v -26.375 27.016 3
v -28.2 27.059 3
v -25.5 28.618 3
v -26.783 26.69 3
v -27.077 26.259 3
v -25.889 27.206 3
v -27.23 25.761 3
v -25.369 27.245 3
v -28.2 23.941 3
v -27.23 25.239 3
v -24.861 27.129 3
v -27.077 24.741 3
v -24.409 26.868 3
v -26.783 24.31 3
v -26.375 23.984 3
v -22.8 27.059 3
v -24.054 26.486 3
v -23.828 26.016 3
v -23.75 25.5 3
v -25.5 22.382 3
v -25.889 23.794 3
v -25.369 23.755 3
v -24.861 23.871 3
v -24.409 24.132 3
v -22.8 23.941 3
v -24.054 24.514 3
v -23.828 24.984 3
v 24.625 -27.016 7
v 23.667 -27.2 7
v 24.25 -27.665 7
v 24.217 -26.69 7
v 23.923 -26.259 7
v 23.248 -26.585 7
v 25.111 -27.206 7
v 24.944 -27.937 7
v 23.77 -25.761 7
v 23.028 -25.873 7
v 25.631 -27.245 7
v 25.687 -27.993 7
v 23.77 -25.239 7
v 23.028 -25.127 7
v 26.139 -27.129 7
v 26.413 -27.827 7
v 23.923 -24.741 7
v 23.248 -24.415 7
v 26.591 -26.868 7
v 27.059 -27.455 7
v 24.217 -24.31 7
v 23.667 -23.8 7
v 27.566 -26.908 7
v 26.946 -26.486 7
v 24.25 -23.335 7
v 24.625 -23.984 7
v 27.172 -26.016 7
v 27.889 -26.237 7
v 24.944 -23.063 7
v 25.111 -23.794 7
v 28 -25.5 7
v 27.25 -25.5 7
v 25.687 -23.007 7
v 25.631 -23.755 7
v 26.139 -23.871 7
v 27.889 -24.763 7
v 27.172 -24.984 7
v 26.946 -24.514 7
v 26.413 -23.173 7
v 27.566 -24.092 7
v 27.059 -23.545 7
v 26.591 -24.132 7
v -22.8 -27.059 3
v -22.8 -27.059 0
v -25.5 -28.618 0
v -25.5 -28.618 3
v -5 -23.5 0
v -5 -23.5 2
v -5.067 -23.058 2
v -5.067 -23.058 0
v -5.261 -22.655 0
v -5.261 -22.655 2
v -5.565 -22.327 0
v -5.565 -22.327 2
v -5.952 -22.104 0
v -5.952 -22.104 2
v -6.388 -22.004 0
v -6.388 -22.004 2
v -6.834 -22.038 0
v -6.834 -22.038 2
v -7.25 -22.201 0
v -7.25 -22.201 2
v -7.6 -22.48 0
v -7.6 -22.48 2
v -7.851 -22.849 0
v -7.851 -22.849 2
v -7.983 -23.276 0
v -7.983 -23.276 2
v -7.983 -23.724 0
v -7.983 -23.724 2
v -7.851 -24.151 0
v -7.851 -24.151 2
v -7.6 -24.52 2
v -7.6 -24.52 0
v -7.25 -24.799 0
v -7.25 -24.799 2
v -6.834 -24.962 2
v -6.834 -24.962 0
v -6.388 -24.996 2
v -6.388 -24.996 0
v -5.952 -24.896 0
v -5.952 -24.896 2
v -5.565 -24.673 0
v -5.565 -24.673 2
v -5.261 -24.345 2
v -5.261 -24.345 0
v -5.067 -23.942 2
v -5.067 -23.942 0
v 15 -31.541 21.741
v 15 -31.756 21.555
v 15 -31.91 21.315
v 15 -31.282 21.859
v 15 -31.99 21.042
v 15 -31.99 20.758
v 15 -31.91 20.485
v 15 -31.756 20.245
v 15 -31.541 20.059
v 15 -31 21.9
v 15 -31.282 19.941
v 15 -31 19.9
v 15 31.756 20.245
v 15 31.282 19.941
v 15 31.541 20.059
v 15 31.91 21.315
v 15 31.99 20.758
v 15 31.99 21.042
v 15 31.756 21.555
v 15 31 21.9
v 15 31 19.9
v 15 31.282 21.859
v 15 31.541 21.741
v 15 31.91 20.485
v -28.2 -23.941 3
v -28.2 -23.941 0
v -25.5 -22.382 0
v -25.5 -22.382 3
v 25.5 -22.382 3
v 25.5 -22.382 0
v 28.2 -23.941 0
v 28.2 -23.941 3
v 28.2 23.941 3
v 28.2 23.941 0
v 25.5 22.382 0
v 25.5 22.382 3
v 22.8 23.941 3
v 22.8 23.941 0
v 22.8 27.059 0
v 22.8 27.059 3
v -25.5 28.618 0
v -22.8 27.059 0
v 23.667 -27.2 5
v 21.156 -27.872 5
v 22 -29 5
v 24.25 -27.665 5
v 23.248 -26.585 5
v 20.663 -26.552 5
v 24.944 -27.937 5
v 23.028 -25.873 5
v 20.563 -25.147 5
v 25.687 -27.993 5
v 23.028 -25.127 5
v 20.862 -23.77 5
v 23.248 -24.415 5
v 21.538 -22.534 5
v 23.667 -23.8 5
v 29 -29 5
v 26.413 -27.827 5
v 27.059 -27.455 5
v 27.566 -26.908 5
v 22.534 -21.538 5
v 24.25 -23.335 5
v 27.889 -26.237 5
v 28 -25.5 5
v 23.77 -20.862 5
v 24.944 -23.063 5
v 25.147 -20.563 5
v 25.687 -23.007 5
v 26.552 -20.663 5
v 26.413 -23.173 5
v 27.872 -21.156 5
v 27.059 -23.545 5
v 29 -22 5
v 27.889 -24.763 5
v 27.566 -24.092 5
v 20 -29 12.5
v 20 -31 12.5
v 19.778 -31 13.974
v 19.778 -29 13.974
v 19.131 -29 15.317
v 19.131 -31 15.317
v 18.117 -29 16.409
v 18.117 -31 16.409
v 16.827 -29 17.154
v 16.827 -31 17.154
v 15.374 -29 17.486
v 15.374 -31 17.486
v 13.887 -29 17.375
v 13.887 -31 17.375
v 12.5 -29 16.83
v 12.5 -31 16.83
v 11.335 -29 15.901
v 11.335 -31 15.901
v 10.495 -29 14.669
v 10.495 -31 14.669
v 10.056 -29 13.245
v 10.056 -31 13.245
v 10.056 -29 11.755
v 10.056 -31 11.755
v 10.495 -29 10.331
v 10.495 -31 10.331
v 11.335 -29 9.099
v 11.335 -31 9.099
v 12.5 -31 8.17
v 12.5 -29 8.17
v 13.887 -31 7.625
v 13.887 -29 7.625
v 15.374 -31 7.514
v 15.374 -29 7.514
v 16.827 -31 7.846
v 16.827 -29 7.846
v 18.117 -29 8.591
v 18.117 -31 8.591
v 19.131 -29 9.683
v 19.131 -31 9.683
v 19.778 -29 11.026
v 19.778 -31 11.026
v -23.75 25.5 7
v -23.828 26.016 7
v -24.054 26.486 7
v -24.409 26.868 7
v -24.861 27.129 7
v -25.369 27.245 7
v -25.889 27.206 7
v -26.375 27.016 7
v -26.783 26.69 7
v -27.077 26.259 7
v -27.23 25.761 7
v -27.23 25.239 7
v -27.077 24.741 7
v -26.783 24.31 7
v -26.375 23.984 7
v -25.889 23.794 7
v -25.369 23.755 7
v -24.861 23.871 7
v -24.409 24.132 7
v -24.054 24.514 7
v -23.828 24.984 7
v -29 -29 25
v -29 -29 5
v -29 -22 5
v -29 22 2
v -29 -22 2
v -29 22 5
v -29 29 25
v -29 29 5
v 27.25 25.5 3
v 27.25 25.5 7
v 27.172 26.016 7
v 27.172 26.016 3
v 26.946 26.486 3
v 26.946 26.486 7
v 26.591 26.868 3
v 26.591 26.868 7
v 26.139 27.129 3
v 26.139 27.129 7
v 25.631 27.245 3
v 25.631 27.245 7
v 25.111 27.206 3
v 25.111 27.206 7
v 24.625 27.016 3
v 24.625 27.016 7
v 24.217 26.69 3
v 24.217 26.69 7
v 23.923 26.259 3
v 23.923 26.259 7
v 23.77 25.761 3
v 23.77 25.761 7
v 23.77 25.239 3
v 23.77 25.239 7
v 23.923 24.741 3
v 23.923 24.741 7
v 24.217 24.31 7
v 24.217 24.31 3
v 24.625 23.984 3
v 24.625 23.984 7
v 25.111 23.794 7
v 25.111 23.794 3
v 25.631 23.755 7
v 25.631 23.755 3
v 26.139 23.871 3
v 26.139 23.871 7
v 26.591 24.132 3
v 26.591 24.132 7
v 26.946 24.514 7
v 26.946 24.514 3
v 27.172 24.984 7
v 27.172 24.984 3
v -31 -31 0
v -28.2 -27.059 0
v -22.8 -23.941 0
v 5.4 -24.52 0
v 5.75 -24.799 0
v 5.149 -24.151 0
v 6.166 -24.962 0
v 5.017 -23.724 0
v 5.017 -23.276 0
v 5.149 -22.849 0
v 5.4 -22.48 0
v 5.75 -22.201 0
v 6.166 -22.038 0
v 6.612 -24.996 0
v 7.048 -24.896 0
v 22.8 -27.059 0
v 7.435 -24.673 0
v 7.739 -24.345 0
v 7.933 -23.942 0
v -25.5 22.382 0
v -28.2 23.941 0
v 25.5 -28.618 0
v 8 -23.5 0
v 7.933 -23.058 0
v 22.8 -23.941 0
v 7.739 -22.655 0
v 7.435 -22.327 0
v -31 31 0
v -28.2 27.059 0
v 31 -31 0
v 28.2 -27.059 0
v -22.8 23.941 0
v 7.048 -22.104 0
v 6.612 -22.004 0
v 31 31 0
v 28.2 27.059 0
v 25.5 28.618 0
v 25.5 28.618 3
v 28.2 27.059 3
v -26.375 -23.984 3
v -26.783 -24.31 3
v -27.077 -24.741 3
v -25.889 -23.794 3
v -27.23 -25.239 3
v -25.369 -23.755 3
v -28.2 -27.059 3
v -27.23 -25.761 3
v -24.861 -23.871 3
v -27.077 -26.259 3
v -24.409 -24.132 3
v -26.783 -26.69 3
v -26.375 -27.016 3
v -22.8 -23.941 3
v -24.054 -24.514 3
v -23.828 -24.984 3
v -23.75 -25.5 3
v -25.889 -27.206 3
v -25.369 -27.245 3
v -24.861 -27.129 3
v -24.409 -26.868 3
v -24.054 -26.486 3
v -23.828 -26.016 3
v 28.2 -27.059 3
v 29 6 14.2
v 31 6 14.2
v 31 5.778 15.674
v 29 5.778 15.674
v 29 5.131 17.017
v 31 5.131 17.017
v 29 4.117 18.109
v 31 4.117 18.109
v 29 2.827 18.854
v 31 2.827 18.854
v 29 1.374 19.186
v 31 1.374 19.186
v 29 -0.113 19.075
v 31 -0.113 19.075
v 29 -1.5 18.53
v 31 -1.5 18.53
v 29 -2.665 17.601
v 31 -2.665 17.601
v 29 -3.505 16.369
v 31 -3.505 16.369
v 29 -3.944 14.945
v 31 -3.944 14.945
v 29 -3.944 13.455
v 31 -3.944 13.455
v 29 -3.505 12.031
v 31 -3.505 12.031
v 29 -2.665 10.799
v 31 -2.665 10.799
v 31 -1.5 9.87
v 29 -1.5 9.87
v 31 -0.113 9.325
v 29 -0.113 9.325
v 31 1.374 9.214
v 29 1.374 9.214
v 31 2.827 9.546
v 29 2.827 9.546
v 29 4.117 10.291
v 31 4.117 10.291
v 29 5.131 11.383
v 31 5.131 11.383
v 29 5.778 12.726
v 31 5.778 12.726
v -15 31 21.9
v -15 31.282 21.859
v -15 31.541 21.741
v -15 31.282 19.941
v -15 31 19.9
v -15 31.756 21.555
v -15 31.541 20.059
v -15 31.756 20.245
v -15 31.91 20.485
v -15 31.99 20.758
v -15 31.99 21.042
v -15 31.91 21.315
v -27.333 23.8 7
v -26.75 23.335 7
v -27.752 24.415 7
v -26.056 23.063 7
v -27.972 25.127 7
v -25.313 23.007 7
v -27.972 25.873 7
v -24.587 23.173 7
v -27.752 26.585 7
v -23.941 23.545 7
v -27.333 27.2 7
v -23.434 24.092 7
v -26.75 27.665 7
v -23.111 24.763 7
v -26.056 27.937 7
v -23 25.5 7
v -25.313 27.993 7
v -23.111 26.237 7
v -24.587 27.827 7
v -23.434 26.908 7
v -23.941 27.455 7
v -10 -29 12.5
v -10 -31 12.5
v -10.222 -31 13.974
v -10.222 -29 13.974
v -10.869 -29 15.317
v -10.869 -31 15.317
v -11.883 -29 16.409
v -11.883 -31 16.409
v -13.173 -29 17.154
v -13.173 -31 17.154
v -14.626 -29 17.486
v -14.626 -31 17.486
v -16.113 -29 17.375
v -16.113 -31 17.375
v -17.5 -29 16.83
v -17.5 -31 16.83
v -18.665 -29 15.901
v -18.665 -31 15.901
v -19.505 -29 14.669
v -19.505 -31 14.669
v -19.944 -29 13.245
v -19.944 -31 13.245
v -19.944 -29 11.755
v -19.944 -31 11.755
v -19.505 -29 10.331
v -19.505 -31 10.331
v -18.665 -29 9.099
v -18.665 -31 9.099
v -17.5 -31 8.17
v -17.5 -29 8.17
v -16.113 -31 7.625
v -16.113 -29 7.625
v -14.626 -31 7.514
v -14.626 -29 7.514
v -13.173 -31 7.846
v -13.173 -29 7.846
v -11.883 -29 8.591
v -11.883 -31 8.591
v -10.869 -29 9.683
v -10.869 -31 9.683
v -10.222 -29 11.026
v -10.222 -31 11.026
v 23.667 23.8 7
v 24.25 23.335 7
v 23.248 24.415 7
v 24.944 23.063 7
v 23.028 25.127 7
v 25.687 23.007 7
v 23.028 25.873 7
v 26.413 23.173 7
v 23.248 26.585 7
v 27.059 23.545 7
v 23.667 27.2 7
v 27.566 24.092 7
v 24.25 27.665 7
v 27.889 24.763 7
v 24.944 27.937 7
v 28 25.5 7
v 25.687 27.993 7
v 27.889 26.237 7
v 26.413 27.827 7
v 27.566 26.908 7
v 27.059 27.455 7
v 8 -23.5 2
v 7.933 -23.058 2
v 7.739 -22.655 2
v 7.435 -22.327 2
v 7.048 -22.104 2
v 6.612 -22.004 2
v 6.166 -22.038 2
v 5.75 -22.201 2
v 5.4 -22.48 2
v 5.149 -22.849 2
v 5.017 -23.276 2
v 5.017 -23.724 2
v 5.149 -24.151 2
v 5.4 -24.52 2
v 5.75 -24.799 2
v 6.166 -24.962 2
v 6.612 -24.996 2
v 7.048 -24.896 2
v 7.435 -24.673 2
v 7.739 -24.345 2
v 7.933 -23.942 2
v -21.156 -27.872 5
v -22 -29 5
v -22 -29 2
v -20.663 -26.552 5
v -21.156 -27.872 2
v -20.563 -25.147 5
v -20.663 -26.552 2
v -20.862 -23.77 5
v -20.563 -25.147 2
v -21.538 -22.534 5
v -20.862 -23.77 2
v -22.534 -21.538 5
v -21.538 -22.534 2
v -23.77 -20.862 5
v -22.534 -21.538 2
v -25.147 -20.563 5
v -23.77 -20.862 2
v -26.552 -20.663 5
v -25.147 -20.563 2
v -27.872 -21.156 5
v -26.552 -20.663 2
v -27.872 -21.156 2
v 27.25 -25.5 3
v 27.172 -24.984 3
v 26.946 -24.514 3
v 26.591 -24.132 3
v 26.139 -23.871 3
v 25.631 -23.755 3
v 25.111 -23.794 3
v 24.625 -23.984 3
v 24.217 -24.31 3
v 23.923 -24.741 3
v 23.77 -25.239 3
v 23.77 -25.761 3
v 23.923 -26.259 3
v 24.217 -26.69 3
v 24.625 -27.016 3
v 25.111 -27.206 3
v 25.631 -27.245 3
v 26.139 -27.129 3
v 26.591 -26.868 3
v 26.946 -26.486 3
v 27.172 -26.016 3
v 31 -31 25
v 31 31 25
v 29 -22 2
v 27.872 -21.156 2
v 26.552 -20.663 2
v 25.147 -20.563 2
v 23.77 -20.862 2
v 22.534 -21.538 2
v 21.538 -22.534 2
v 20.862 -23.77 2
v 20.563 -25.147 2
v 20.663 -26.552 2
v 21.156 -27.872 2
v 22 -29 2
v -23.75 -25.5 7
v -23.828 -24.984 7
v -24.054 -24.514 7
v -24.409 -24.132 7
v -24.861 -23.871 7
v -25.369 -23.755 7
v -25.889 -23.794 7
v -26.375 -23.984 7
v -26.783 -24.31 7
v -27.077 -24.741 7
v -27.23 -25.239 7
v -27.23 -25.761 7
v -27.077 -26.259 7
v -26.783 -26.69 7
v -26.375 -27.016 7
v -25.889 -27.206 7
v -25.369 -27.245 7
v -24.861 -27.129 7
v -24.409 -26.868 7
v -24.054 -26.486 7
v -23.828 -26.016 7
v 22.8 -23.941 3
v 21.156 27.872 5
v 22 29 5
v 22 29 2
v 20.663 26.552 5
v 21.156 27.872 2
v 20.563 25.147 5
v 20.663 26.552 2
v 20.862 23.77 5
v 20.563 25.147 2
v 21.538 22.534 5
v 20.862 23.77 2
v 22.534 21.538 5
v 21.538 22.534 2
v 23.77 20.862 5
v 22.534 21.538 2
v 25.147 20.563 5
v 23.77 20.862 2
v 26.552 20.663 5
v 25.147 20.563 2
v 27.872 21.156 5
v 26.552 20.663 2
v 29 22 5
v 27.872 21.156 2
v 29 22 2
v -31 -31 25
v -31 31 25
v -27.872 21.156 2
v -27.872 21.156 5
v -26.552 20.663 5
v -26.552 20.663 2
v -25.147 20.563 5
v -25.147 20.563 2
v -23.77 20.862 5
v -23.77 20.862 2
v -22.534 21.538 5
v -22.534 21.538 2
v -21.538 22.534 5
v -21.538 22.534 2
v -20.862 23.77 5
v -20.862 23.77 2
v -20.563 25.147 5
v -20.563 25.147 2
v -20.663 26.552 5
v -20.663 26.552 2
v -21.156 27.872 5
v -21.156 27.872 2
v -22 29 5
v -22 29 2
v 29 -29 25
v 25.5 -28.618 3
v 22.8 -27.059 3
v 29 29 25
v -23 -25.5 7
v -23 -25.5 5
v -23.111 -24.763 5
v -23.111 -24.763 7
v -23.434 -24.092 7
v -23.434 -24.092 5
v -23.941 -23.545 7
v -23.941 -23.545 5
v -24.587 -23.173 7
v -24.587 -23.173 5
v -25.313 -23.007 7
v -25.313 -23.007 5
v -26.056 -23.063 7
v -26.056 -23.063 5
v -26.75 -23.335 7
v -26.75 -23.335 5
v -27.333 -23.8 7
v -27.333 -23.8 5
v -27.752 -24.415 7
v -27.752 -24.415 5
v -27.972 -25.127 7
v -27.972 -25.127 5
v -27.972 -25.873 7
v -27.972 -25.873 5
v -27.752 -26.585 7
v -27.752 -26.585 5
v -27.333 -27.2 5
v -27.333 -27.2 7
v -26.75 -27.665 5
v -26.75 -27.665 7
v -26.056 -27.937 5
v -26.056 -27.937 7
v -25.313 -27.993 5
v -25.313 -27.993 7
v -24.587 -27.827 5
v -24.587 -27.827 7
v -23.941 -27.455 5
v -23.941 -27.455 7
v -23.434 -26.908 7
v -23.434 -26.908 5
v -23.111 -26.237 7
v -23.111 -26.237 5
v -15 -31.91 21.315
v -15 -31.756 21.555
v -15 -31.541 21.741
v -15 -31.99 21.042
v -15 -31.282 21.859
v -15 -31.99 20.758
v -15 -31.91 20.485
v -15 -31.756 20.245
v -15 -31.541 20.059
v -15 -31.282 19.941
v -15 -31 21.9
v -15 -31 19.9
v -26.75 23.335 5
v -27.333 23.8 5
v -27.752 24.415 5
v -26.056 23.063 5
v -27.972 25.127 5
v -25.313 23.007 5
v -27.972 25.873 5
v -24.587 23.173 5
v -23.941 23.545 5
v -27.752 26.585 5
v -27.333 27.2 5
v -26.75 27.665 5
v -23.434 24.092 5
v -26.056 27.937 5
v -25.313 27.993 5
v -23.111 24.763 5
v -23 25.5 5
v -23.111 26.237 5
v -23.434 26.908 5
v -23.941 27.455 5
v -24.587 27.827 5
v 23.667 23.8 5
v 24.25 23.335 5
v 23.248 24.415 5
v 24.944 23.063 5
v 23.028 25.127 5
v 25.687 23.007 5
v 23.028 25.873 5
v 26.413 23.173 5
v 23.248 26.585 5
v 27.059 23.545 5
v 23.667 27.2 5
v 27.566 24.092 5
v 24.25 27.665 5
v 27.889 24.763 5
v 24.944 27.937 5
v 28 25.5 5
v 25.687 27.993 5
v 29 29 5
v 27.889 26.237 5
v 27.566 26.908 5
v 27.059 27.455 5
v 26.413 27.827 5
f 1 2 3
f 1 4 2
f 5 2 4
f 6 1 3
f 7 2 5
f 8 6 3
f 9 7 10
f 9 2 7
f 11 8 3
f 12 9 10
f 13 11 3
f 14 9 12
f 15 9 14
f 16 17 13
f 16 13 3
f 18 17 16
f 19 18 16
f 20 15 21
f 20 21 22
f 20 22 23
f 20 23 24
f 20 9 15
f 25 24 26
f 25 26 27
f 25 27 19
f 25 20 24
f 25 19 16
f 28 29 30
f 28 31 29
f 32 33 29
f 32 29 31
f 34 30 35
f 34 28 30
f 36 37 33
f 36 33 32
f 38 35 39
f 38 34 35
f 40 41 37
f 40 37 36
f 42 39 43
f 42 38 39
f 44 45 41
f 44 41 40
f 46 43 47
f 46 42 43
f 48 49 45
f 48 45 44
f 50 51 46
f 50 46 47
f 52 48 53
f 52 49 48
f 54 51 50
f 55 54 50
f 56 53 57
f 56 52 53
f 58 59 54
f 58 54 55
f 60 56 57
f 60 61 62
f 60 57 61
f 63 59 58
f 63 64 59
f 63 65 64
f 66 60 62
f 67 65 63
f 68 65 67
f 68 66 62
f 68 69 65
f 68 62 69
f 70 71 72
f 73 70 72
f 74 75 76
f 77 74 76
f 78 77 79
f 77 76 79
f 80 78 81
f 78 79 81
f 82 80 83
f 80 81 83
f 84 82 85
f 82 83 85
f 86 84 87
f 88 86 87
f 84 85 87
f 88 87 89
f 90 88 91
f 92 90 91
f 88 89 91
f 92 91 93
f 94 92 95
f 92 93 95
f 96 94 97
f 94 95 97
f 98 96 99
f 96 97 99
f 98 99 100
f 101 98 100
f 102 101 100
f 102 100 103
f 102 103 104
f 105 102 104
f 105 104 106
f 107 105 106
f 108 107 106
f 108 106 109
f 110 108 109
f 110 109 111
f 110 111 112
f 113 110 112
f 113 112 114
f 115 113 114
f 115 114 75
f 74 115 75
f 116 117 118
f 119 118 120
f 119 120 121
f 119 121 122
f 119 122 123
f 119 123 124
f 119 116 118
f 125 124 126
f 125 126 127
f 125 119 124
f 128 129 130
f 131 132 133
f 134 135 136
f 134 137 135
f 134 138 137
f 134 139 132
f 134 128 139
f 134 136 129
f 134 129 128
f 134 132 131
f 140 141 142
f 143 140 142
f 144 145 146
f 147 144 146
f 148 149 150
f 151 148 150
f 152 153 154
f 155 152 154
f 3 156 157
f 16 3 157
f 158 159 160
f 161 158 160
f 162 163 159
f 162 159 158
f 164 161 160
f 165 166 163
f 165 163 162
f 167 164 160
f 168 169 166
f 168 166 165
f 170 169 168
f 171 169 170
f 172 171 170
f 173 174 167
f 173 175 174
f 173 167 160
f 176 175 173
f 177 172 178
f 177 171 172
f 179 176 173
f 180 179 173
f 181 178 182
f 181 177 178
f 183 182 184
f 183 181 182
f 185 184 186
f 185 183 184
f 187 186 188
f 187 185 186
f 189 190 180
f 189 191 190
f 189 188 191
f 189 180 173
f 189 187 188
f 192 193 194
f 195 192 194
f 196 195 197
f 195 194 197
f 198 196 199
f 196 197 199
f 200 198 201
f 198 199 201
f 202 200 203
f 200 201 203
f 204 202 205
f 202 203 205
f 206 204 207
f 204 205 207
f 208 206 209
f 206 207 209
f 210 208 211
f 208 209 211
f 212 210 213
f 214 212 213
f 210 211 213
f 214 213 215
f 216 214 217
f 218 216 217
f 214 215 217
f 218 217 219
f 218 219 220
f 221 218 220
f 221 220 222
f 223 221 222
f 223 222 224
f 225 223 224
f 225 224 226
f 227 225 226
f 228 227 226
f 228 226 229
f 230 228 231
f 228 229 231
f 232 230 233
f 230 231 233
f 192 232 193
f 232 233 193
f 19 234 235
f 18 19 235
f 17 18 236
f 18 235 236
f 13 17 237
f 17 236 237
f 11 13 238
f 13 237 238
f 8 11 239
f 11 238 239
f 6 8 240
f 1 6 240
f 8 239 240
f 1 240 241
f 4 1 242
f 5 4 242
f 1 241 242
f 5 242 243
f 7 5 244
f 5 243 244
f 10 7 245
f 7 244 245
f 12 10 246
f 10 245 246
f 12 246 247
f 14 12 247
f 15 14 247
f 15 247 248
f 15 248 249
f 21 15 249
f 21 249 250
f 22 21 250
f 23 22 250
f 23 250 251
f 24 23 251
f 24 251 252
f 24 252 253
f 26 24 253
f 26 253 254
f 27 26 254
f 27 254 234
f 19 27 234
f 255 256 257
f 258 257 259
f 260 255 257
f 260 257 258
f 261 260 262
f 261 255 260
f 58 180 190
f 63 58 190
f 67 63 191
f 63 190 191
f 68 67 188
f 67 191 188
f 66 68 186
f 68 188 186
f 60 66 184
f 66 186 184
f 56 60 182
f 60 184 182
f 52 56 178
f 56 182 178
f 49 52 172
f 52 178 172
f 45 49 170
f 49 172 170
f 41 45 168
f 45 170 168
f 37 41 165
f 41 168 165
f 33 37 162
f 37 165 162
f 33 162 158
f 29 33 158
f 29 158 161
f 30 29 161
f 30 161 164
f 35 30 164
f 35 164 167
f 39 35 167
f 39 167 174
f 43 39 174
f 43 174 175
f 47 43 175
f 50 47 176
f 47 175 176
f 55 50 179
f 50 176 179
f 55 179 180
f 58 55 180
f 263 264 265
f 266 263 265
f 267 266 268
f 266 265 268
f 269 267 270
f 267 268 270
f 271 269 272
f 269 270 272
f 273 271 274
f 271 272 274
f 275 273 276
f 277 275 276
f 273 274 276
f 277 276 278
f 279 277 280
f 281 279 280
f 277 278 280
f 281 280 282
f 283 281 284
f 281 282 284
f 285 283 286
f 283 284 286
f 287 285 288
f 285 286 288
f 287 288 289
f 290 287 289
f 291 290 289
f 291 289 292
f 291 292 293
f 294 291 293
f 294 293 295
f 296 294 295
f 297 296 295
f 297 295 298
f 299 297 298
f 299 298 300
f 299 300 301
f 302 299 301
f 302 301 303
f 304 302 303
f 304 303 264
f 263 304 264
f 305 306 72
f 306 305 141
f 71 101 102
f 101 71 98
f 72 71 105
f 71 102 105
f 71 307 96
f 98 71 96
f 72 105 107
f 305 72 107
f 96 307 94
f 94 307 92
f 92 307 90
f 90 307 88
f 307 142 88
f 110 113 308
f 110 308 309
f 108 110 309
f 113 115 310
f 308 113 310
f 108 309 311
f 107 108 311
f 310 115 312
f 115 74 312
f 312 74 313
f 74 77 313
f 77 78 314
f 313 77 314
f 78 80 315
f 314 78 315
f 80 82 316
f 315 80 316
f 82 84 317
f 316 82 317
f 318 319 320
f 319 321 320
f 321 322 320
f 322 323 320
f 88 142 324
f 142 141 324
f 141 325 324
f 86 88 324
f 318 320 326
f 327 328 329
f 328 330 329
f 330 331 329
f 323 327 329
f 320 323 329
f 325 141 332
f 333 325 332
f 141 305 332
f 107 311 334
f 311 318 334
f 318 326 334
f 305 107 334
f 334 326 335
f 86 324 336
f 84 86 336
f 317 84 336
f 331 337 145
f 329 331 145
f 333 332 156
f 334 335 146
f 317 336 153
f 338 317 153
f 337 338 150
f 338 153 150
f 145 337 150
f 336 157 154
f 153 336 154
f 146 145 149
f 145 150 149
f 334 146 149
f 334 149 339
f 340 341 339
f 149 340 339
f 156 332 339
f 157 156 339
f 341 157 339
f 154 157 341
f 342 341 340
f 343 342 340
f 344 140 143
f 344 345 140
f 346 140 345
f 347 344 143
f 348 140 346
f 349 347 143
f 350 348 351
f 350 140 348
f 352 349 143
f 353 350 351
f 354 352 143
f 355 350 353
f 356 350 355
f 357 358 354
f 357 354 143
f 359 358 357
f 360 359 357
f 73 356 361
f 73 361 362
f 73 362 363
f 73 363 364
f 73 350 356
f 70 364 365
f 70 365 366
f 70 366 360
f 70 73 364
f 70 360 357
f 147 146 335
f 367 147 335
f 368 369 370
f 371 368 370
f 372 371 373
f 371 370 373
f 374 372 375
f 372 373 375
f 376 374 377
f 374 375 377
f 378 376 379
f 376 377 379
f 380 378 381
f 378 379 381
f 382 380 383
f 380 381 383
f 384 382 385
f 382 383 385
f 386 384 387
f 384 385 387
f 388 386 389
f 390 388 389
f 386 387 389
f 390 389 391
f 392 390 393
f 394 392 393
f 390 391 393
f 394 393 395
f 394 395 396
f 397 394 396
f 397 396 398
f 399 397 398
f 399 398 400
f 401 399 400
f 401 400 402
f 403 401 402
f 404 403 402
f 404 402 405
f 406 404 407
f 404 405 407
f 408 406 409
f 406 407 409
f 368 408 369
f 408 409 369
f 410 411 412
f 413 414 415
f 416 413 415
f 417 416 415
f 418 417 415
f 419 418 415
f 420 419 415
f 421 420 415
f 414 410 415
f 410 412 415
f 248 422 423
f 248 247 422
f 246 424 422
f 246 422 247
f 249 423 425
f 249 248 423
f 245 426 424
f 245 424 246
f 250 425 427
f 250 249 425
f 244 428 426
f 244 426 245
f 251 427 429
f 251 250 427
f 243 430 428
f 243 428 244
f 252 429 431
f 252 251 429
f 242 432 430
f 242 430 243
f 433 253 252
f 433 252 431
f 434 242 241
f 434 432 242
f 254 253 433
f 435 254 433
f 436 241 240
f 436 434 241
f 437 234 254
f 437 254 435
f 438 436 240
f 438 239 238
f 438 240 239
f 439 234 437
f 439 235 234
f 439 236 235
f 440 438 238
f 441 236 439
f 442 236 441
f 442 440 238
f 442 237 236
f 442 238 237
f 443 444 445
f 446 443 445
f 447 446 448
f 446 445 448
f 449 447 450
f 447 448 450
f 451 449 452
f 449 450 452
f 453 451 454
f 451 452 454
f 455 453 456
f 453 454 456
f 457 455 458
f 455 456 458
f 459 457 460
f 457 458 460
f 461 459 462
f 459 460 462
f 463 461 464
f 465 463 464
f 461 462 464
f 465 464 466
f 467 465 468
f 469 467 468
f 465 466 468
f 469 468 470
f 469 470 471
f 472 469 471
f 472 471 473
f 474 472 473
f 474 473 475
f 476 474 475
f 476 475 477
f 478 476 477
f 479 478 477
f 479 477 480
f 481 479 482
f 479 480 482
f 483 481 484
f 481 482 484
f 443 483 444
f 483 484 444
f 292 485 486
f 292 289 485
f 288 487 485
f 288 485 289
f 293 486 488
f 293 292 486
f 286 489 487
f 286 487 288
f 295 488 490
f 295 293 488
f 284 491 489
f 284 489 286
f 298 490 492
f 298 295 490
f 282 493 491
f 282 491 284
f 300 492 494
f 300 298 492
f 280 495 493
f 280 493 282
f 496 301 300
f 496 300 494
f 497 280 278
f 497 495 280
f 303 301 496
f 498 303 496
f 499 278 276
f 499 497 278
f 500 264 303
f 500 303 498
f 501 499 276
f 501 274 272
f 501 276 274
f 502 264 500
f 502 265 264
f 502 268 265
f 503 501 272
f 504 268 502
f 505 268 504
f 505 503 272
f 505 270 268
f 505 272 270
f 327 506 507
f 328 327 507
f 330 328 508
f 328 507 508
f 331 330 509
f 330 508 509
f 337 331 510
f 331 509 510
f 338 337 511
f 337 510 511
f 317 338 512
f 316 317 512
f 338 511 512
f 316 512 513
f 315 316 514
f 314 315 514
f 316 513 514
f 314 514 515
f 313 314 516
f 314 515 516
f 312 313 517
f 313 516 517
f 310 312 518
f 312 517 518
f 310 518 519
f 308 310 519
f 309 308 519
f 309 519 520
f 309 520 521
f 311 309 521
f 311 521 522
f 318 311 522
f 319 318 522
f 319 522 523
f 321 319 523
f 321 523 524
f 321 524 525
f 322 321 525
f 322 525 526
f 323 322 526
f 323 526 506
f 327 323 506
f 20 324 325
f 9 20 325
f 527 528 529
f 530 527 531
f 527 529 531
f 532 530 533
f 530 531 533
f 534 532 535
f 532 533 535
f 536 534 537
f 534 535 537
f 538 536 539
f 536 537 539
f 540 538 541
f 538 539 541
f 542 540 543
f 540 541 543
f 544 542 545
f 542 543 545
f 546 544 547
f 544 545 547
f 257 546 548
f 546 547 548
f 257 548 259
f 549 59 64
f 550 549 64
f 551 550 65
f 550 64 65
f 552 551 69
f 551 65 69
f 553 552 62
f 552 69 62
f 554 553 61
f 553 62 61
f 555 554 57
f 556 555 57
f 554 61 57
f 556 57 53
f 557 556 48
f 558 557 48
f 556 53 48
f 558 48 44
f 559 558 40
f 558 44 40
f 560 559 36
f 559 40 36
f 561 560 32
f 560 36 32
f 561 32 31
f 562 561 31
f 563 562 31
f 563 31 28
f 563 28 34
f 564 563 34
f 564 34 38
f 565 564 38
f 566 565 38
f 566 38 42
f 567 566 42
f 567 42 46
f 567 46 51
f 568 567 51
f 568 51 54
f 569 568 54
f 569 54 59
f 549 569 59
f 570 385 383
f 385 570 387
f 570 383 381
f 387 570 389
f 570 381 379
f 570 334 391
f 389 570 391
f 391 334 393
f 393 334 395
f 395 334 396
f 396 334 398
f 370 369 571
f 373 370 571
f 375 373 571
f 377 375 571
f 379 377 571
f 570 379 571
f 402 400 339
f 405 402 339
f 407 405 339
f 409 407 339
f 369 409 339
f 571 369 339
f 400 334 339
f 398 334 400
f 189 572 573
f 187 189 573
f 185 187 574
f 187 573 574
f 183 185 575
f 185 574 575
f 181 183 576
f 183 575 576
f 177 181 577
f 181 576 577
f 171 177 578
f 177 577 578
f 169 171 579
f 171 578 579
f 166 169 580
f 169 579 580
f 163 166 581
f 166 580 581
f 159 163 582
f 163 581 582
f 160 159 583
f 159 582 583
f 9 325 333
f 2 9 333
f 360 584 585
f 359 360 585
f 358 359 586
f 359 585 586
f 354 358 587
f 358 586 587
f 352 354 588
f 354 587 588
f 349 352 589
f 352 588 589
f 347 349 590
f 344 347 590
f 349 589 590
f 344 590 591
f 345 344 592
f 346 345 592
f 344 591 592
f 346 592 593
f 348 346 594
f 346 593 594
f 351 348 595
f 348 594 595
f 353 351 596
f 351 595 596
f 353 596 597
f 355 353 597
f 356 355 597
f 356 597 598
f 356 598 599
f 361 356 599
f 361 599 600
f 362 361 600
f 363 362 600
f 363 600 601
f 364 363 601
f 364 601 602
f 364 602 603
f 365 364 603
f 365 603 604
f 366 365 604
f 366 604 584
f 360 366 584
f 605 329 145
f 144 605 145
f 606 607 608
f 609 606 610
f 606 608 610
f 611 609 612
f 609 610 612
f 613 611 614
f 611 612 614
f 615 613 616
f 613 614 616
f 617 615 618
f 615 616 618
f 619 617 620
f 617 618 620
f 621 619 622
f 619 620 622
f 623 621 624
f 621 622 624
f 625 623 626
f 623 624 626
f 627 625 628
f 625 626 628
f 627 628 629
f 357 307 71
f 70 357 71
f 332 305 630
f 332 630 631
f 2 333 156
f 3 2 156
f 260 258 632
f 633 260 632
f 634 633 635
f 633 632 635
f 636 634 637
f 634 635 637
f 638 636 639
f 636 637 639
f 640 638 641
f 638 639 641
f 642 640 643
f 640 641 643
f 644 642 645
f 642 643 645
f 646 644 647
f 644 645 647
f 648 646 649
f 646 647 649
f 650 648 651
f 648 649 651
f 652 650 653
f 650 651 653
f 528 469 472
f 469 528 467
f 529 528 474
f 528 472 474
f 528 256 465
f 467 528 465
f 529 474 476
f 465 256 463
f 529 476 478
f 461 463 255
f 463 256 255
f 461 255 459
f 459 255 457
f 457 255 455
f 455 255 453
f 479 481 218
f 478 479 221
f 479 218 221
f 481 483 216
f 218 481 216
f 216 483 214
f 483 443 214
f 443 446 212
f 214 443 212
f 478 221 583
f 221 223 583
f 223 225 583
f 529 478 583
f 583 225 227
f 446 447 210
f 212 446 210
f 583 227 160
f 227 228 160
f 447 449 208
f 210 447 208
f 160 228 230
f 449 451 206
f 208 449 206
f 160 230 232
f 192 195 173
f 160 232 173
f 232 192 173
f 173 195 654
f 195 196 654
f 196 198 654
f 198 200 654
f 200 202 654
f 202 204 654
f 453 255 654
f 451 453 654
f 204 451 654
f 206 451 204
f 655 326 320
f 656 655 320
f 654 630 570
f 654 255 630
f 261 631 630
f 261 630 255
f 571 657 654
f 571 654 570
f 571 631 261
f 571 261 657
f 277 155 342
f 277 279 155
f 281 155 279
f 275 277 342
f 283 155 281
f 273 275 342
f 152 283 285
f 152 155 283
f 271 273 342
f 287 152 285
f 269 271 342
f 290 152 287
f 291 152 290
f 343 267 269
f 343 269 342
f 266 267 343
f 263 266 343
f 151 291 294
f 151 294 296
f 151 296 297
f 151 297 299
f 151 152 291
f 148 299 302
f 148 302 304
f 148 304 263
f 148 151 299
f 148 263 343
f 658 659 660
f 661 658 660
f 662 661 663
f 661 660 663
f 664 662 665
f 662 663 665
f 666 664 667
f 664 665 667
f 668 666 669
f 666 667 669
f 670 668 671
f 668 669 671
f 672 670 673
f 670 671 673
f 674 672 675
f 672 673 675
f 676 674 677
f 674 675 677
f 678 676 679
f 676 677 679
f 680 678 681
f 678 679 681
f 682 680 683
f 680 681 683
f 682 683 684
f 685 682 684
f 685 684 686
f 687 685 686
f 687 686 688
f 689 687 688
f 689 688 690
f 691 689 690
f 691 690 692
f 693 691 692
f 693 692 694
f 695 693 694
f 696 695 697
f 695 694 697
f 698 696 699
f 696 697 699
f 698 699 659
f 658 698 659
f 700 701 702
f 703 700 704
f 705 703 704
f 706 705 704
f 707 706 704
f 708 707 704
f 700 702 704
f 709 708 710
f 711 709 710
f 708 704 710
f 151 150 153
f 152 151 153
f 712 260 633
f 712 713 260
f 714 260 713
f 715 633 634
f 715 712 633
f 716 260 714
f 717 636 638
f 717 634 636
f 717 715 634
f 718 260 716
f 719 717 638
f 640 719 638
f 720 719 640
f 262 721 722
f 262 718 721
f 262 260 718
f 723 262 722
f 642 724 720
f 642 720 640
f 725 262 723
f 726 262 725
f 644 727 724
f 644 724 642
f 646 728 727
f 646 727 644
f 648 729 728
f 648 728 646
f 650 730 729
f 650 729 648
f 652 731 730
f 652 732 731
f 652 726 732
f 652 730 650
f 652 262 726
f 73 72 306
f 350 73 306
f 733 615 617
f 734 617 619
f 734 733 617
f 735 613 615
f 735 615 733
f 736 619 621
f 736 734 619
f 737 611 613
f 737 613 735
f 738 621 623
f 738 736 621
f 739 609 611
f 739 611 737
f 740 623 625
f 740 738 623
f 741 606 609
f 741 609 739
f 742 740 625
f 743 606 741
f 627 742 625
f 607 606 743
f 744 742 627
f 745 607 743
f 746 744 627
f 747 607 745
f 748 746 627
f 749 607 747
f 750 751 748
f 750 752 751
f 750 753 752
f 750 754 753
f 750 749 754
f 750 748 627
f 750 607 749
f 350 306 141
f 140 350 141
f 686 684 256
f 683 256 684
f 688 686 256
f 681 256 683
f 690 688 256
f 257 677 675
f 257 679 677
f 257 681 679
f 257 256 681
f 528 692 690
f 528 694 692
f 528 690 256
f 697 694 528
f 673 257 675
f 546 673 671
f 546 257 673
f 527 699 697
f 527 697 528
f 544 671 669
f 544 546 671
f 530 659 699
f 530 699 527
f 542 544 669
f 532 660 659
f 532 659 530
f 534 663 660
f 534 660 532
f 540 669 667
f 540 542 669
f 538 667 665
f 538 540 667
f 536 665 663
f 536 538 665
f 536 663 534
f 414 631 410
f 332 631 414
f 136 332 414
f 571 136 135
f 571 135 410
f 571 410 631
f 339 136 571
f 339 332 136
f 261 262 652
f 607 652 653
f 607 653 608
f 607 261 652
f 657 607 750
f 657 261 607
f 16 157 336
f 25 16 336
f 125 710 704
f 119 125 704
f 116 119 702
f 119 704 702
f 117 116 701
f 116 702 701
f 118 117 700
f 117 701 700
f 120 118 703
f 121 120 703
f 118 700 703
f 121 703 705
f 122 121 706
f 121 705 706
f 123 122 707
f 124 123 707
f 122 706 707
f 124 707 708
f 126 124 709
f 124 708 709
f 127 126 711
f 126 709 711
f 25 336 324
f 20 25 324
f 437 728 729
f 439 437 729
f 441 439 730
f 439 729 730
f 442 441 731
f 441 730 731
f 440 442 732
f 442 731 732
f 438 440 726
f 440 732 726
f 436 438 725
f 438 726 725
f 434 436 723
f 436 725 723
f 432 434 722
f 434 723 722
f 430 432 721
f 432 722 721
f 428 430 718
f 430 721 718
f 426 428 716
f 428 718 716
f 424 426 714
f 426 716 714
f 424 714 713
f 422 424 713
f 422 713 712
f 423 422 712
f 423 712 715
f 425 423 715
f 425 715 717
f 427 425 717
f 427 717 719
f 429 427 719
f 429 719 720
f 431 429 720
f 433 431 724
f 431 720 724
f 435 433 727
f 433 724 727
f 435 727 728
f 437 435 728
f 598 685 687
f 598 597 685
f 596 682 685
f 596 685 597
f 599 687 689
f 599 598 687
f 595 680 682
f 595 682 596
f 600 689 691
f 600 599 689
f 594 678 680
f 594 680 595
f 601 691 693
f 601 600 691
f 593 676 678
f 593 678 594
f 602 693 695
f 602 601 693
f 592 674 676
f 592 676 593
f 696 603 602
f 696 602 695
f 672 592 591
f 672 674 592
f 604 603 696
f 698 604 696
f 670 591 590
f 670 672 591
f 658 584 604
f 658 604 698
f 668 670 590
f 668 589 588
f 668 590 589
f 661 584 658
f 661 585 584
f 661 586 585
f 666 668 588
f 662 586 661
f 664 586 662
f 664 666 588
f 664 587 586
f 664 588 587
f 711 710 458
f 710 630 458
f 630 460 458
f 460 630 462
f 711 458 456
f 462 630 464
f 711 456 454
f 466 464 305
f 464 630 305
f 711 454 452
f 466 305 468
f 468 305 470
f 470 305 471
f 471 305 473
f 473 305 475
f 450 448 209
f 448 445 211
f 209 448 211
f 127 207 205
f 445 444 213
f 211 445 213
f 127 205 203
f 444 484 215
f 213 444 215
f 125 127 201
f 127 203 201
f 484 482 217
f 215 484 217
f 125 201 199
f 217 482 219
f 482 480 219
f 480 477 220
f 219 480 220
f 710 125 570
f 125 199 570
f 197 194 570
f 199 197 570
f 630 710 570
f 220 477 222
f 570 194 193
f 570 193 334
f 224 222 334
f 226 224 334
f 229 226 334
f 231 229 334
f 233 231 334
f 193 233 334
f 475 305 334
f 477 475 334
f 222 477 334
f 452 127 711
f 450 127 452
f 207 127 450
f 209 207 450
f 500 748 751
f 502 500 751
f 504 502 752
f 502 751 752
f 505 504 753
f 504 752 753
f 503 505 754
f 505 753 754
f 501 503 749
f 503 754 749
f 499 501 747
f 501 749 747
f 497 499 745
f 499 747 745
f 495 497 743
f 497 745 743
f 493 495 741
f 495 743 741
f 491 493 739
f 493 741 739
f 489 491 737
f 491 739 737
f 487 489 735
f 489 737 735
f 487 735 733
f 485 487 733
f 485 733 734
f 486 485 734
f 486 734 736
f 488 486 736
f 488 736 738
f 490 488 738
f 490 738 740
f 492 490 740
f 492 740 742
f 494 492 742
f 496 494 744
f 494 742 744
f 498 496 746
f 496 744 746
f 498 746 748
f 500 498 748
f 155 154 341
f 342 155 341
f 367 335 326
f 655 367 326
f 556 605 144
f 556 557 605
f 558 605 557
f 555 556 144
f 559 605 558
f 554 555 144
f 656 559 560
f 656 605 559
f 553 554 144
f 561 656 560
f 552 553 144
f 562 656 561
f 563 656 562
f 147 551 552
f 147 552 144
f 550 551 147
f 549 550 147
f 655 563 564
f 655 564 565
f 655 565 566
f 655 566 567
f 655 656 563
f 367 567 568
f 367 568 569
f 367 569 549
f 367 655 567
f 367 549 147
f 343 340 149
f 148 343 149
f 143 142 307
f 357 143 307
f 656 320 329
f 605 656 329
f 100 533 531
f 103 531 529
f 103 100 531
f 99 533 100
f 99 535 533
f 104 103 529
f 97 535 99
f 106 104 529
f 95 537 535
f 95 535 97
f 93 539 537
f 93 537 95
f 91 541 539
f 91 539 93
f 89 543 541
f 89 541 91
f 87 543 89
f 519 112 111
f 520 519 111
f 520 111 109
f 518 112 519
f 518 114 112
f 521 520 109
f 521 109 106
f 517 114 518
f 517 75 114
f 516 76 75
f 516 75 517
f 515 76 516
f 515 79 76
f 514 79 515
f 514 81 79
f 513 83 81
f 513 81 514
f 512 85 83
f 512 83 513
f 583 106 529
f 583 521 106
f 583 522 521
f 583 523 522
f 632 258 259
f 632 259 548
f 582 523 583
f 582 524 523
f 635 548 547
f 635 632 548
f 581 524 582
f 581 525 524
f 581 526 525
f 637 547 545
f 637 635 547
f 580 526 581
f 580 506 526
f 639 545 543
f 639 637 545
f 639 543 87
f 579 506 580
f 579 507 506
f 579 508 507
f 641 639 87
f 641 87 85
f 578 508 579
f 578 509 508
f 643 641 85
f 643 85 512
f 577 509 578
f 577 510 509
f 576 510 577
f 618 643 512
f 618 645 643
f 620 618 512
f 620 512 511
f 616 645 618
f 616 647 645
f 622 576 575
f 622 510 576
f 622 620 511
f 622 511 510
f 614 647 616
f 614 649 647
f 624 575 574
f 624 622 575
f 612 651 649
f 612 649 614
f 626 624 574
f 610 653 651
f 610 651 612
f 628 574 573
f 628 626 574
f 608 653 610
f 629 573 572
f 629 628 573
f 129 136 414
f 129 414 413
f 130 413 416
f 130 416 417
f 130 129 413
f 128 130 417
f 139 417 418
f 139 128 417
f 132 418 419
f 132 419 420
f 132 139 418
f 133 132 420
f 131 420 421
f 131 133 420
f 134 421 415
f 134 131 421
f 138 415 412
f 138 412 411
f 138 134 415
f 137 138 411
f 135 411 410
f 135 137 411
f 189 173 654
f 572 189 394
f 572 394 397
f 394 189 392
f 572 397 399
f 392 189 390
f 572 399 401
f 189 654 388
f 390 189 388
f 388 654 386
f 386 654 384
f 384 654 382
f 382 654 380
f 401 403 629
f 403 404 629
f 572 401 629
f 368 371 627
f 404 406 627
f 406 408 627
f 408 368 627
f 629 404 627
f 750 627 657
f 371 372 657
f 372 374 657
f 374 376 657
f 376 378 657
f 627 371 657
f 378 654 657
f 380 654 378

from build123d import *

# Parameters (mm, degrees)
SKETCH_W        = 62
SKETCH_H        = 62
PAD_DEPTH       = 25
SKETCH001_W     = 58
SKETCH001_H     = 58
POCKET_DEPTH    = 23
SKETCH002_R     = 4.9497474683
PAD001_DEPTH    = 3
SKETCH003_R     = 2.5
PAD002_DEPTH    = 2
SKETCH004_R     = 1.75
POCKET001_DEPTH = 7.001
POCKET002_DEPTH = 3
SKETCH006_R     = 1.5
POCKET003_DEPTH = 2.001
SKETCH007_R     = 5
POCKET004_DEPTH = 2
SKETCH008_R     = 5
POCKET005_DEPTH = 2
SKETCH009_R     = 1
PAD003_DEPTH    = 15


with BuildPart() as part:
    # Sketch → Pad (new body)
    with BuildSketch(Plane.XY):
        Rectangle(SKETCH_W, SKETCH_H)
    extrude(amount=PAD_DEPTH)

    # Sketch001 (on Face6 of Pad) → Pocket (cut)
    with BuildSketch(Plane.XY.offset(25)):
        Rectangle(SKETCH001_W, SKETCH001_H)
    extrude(amount=-POCKET_DEPTH, mode=Mode.SUBTRACT)

    # Sketch002 (on Face11 of Pocket) → Pad001 (join)
    with BuildSketch(Plane.XY.offset(2)):
        with Locations((-25.5, 25.5)):
            Circle(SKETCH002_R)
        with Locations((25.5, 25.5)):
            Circle(SKETCH002_R)
        with Locations((25.5, -25.5)):
            Circle(SKETCH002_R)
        with Locations((-25.5, -25.5)):
            Circle(SKETCH002_R)
    extrude(amount=PAD001_DEPTH)

    # Sketch003 (on Face15 of Pad001) → Pad002 (join)
    with BuildSketch(Plane.XY.offset(5)):
        with Locations((-25.5, 25.5)):
            Circle(SKETCH003_R)
        with Locations((25.5, 25.5)):
            Circle(SKETCH003_R)
        with Locations((25.5, -25.5)):
            Circle(SKETCH003_R)
        with Locations((-25.5, -25.5)):
            Circle(SKETCH003_R)
    extrude(amount=PAD002_DEPTH)

    # Sketch004 (on Face27 of Pad002) → Pocket001 (cut, through all)
    with BuildSketch(Plane.XY.offset(7)):
        with Locations((-25.5, 25.5)):
            Circle(SKETCH004_R)
        with Locations((25.5, 25.5)):
            Circle(SKETCH004_R)
        with Locations((25.5, -25.5)):
            Circle(SKETCH004_R)
        with Locations((-25.5, -25.5)):
            Circle(SKETCH004_R)
    extrude(amount=-POCKET001_DEPTH, mode=Mode.SUBTRACT)

    # Sketch005 (on Face4 of Pocket001) → Pocket002 (cut)
    with BuildSketch(Plane(origin=(0, 0, 0), x_dir=(1, 0, 0), z_dir=(0, 0, -1))):
        Polygon((-22.8, 23.9411542732), (-22.8, 27.0588457268), (-25.5, 28.6176914536), (-28.2, 27.0588457268), (-28.2, 23.9411542732), (-25.5, 22.3823085464), align=None)
        Polygon((22.8, 23.9411542732), (25.5, 22.3823085464), (28.2, 23.9411542732), (28.2, 27.0588457268), (25.5, 28.6176914536), (22.8, 27.0588457268), align=None)
        Polygon((-22.8, -27.0588457268), (-22.8, -23.9411542732), (-25.5, -22.3823085464), (-28.2, -23.9411542732), (-28.2, -27.0588457268), (-25.5, -28.6176914536), align=None)
        Polygon((25.5, -28.6176914536), (28.2, -27.0588457268), (28.2, -23.9411542732), (25.5, -22.3823085464), (22.8, -23.9411542732), (22.8, -27.0588457268), align=None)
    extrude(amount=-POCKET002_DEPTH, mode=Mode.SUBTRACT)

    # Sketch006 (on Face41 of Pocket002) → Pocket003 (cut, through all)
    with BuildSketch(Plane.XY.offset(2)):
        with Locations((-6.5, -23.5)):
            Circle(SKETCH006_R)
        with Locations((6.5, -23.5)):
            Circle(SKETCH006_R)
    extrude(amount=-POCKET003_DEPTH, mode=Mode.SUBTRACT)

    # Sketch007 (on Face6 of Pocket003) → Pocket004 (cut)
    with BuildSketch(Plane.XZ.offset(31)):
        with Locations((-15, 12.5)):
            Circle(SKETCH007_R)
        with Locations((15, 12.5)):
            Circle(SKETCH007_R)
    extrude(amount=-POCKET004_DEPTH, mode=Mode.SUBTRACT)

    # Sketch008 (on Face3 of Pocket004) → Pocket005 (cut)
    with BuildSketch(Plane.YZ.offset(31)):
        with Locations((1, 14.2)):
            Circle(SKETCH008_R)
    extrude(amount=-POCKET005_DEPTH, mode=Mode.SUBTRACT)

    # Sketch009 (on DatumPlane) → Pad003 (join, symmetric)
    with BuildSketch(Plane(origin=(0, -31, 25), x_dir=(0, 1, 0), z_dir=(1, 0, 0))):
        with Locations((0, -4.1)):
            Circle(SKETCH009_R)
        with Locations((62, -4.1)):
            Circle(SKETCH009_R)
    extrude(amount=PAD003_DEPTH, both=True)


solid = part.part
